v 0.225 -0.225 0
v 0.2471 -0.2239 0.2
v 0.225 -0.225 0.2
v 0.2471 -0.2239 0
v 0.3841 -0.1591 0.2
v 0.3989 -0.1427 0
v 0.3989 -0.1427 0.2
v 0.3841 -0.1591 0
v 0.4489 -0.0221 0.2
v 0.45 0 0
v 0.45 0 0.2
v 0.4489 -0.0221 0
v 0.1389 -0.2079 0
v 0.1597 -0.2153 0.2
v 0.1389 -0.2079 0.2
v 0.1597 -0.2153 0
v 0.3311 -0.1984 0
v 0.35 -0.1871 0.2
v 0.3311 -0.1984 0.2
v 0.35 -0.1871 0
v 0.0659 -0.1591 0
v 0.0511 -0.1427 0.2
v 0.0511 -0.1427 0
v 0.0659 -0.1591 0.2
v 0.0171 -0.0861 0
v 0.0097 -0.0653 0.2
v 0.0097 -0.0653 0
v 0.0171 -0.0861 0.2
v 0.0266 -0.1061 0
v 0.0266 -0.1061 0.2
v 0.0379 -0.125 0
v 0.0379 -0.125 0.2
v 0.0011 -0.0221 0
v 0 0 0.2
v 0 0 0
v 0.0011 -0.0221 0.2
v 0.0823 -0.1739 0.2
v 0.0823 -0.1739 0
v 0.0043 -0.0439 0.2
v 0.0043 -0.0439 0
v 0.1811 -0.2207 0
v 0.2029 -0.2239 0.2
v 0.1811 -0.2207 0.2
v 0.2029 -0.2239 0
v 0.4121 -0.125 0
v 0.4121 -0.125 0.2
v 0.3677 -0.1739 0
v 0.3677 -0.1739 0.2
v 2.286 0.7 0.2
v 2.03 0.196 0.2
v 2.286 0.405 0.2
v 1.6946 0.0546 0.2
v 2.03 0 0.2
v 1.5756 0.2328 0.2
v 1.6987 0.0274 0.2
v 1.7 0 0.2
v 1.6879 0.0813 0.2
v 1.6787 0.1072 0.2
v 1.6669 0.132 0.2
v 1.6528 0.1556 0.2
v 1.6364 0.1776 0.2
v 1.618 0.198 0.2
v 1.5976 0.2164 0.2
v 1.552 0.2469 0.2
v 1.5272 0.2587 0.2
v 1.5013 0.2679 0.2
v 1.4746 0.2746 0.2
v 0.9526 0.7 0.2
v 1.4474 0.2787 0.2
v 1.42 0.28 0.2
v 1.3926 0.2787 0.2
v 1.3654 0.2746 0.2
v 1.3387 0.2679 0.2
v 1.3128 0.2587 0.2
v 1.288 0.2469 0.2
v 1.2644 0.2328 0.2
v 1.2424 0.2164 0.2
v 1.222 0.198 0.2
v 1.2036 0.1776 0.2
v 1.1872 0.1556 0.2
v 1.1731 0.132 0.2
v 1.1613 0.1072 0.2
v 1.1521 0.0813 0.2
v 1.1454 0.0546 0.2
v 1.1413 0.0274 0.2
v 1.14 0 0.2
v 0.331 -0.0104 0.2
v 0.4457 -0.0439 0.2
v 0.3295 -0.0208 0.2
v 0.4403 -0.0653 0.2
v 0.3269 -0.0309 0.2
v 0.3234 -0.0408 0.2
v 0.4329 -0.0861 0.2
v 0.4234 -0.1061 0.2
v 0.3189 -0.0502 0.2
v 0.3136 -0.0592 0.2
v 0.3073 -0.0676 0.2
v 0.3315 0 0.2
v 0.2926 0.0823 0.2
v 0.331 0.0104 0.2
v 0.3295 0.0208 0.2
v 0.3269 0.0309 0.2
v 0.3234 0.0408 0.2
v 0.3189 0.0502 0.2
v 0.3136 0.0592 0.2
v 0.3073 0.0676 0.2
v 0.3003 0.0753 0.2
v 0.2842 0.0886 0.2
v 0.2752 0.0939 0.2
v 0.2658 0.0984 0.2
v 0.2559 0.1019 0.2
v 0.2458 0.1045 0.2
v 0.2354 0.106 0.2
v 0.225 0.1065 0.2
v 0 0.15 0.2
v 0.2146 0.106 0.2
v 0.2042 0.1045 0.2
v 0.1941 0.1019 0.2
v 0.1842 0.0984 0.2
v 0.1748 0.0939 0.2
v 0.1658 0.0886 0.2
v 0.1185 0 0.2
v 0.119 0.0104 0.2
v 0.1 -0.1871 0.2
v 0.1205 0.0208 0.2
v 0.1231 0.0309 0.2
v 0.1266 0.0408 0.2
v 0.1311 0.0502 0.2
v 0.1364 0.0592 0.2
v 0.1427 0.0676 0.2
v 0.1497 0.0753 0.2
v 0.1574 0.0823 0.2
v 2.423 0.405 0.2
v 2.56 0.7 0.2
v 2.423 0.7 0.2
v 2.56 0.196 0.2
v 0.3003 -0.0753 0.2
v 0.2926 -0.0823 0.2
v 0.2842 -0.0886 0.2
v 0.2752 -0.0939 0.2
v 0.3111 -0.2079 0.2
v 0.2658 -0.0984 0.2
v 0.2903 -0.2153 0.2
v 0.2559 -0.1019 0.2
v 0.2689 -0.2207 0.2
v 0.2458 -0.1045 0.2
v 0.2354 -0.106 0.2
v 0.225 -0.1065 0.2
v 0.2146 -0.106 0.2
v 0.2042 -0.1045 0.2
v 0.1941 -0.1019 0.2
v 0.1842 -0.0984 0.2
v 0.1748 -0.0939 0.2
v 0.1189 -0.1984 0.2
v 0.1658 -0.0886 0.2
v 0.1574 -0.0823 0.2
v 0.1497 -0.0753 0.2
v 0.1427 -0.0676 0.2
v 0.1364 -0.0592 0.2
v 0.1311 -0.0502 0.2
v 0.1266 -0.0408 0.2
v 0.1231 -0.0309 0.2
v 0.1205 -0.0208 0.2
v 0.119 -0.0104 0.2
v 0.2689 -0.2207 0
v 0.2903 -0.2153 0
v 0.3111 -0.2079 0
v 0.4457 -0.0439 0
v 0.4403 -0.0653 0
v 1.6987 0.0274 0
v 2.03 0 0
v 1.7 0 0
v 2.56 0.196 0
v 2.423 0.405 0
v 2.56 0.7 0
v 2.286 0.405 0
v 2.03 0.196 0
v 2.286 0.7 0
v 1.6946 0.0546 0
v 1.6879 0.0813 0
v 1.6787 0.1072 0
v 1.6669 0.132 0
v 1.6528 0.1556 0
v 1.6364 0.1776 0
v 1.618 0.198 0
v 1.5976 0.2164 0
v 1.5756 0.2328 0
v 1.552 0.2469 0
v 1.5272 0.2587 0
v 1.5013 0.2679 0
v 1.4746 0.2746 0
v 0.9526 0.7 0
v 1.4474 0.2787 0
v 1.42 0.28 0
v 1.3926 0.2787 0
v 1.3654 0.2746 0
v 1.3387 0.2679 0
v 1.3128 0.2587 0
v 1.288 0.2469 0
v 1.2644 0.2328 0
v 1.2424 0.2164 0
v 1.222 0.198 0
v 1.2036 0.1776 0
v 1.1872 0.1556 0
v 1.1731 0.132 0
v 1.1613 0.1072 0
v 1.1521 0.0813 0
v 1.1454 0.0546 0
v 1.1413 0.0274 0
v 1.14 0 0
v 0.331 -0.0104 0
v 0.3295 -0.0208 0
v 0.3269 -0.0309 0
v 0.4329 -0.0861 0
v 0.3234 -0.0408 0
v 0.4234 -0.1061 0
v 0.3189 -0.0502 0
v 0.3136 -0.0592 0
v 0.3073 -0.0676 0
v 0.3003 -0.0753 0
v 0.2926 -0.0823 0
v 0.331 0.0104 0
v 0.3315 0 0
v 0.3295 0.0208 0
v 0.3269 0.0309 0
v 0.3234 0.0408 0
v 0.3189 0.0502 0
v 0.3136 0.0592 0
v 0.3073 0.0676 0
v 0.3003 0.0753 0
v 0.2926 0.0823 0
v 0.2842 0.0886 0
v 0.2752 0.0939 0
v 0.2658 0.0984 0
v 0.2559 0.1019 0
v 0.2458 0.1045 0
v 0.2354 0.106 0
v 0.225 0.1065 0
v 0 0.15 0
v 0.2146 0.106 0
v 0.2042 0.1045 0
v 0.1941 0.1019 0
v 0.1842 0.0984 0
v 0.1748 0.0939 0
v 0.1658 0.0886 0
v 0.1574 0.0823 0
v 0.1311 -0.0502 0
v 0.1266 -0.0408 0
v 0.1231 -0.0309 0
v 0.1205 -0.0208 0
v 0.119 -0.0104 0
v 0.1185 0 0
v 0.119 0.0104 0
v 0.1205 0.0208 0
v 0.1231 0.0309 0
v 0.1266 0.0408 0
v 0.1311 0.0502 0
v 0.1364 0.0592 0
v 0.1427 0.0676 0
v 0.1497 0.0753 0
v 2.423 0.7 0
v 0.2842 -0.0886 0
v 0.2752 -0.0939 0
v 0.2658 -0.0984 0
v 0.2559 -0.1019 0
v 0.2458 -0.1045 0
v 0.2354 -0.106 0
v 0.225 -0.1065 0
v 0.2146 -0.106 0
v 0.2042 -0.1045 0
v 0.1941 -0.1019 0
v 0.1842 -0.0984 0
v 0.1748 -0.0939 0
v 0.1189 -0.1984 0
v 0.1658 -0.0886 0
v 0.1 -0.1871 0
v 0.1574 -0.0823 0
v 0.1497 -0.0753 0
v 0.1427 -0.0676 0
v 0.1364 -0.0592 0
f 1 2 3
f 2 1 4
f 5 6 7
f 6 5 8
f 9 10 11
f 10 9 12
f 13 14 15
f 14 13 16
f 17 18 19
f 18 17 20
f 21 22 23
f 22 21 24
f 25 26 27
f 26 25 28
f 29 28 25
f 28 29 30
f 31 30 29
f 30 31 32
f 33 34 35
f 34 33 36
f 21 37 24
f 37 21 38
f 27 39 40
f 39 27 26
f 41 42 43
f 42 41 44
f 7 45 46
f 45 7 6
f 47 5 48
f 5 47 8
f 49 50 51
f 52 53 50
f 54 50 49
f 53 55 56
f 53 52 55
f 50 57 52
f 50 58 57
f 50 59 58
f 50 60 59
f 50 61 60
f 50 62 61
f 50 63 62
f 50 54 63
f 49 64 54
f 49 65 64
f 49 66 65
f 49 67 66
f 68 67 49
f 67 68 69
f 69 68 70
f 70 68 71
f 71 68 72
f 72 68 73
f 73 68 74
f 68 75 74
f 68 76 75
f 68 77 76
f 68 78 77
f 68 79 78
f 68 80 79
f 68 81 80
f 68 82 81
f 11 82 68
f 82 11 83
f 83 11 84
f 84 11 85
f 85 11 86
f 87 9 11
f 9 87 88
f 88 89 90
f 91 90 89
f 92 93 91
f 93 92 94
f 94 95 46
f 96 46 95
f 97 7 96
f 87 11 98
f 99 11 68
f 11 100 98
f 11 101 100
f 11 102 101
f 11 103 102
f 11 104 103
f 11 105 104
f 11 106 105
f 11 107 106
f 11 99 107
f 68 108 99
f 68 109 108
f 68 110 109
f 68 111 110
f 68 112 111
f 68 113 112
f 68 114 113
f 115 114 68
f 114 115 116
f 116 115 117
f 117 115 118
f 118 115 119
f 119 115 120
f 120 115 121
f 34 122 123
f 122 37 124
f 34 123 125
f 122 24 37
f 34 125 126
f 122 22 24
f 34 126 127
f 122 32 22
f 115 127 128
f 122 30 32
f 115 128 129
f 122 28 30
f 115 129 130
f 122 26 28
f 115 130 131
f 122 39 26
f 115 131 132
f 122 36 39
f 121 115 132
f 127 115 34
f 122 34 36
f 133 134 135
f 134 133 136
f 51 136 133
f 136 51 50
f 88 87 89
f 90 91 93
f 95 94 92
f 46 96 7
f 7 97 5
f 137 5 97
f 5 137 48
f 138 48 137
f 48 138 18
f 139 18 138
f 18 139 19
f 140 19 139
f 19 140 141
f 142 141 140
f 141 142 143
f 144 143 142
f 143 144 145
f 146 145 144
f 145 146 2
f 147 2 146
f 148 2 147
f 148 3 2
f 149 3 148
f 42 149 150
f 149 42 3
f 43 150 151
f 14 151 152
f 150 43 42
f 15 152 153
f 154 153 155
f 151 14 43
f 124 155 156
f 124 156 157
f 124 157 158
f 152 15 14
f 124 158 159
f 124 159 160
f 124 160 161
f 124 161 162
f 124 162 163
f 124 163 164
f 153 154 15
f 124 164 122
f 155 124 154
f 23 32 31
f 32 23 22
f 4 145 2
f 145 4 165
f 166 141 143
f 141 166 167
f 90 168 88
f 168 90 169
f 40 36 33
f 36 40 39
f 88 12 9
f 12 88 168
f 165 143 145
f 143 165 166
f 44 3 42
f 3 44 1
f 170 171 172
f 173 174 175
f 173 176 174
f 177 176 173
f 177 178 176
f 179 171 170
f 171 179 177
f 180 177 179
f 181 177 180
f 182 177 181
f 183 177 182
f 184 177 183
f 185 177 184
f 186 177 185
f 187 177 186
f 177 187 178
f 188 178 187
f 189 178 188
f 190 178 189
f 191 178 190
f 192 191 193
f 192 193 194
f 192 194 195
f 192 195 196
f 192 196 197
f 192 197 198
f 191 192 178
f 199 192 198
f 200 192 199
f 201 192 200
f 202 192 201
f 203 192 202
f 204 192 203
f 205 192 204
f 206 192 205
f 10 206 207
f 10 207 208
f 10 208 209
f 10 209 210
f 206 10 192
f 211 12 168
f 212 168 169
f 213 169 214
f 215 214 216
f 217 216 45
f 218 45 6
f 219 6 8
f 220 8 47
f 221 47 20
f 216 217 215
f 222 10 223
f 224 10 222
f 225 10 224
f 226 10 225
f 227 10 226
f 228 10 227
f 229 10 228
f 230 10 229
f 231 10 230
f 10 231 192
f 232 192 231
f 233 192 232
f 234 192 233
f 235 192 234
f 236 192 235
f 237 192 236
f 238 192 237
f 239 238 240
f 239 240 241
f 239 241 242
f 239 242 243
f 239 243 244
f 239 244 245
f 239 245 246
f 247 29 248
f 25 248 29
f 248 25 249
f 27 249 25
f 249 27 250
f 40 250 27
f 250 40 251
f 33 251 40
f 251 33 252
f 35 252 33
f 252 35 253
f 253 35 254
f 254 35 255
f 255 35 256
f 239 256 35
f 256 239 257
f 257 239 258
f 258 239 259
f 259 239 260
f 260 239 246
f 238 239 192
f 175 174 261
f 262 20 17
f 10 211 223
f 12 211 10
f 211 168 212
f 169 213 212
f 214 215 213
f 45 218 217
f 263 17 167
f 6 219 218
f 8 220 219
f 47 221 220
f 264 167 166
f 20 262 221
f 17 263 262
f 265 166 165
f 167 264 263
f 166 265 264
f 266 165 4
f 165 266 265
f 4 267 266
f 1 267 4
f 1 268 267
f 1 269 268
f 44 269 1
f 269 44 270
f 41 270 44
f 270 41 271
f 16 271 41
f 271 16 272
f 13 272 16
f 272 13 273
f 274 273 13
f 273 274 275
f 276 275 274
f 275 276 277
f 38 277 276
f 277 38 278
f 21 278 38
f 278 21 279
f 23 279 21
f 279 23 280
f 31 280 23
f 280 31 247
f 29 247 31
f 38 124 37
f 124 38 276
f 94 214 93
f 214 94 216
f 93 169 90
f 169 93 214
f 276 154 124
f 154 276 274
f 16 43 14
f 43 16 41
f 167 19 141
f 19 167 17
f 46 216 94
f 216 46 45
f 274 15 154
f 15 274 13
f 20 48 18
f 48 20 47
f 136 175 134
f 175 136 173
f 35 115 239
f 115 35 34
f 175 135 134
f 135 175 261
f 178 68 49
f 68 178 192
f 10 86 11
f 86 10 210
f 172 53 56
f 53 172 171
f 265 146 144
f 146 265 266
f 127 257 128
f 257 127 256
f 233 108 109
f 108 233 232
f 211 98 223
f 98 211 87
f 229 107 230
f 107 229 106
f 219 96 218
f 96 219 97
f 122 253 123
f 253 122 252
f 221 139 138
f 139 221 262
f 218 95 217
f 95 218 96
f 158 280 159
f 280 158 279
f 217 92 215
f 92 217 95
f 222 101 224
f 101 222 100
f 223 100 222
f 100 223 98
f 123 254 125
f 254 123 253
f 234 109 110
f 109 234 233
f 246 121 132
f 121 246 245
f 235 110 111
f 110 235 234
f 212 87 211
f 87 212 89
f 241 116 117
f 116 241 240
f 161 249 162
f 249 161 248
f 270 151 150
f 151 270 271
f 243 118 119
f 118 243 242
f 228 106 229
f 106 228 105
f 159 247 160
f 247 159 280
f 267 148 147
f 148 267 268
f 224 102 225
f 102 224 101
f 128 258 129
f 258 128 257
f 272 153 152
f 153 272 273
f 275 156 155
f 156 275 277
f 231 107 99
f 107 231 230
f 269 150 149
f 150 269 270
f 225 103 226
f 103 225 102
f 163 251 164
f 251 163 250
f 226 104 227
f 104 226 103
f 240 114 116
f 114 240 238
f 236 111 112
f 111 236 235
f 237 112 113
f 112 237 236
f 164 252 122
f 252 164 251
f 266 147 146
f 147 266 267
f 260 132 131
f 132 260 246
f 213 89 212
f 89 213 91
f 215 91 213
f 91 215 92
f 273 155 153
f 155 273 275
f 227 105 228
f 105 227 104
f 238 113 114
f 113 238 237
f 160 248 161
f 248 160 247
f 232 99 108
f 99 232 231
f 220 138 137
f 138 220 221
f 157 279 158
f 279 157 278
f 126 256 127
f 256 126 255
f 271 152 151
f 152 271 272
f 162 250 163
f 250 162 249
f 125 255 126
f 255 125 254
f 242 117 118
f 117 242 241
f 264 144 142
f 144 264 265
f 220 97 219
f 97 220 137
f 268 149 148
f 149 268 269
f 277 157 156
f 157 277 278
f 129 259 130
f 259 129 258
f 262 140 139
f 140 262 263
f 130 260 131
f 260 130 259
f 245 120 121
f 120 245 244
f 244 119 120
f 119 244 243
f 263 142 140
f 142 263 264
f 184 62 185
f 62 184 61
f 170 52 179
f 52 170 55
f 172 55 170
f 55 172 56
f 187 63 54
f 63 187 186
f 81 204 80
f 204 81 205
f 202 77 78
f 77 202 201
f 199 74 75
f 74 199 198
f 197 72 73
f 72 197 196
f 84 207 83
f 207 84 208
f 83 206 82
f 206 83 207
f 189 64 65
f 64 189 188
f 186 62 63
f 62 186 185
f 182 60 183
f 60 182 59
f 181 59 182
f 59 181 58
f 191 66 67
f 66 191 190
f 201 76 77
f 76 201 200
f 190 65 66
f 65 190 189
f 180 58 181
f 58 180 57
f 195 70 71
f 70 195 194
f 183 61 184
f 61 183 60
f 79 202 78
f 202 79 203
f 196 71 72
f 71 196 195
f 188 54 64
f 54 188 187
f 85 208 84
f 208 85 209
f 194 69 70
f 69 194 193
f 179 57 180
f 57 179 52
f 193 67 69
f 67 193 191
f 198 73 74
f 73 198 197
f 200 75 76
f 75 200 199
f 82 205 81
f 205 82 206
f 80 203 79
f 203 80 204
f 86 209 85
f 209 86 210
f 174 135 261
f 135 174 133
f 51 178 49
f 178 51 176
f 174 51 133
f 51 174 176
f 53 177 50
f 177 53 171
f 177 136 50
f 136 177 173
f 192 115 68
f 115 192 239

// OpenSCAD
$fn = 64;
height = 0.2;
depth = 0.7;

difference(){
    union(){
        translate([0.225,0,0]){
            cylinder(height,0.225,0.225);
        }
        cube([2.56,depth,height]);
    }
    union(){
        translate([0.225,0,-1]){
            cylinder(2,0.213/2,0.213/2);
        }
        translate([1.42,0,-1]){
            cylinder(2,0.28,0.28);
        }
        translate([2.286,0.405,-1]){
            cube([0.137,2,2]);
        }
        translate([2.03,-1,-1]){
            cube([2,1.196,2]);
        }
        translate([0,0.15,-1]){
            rotate([0,0,30]){
                cube([2,2,2]);
            }
        }
    }
}
